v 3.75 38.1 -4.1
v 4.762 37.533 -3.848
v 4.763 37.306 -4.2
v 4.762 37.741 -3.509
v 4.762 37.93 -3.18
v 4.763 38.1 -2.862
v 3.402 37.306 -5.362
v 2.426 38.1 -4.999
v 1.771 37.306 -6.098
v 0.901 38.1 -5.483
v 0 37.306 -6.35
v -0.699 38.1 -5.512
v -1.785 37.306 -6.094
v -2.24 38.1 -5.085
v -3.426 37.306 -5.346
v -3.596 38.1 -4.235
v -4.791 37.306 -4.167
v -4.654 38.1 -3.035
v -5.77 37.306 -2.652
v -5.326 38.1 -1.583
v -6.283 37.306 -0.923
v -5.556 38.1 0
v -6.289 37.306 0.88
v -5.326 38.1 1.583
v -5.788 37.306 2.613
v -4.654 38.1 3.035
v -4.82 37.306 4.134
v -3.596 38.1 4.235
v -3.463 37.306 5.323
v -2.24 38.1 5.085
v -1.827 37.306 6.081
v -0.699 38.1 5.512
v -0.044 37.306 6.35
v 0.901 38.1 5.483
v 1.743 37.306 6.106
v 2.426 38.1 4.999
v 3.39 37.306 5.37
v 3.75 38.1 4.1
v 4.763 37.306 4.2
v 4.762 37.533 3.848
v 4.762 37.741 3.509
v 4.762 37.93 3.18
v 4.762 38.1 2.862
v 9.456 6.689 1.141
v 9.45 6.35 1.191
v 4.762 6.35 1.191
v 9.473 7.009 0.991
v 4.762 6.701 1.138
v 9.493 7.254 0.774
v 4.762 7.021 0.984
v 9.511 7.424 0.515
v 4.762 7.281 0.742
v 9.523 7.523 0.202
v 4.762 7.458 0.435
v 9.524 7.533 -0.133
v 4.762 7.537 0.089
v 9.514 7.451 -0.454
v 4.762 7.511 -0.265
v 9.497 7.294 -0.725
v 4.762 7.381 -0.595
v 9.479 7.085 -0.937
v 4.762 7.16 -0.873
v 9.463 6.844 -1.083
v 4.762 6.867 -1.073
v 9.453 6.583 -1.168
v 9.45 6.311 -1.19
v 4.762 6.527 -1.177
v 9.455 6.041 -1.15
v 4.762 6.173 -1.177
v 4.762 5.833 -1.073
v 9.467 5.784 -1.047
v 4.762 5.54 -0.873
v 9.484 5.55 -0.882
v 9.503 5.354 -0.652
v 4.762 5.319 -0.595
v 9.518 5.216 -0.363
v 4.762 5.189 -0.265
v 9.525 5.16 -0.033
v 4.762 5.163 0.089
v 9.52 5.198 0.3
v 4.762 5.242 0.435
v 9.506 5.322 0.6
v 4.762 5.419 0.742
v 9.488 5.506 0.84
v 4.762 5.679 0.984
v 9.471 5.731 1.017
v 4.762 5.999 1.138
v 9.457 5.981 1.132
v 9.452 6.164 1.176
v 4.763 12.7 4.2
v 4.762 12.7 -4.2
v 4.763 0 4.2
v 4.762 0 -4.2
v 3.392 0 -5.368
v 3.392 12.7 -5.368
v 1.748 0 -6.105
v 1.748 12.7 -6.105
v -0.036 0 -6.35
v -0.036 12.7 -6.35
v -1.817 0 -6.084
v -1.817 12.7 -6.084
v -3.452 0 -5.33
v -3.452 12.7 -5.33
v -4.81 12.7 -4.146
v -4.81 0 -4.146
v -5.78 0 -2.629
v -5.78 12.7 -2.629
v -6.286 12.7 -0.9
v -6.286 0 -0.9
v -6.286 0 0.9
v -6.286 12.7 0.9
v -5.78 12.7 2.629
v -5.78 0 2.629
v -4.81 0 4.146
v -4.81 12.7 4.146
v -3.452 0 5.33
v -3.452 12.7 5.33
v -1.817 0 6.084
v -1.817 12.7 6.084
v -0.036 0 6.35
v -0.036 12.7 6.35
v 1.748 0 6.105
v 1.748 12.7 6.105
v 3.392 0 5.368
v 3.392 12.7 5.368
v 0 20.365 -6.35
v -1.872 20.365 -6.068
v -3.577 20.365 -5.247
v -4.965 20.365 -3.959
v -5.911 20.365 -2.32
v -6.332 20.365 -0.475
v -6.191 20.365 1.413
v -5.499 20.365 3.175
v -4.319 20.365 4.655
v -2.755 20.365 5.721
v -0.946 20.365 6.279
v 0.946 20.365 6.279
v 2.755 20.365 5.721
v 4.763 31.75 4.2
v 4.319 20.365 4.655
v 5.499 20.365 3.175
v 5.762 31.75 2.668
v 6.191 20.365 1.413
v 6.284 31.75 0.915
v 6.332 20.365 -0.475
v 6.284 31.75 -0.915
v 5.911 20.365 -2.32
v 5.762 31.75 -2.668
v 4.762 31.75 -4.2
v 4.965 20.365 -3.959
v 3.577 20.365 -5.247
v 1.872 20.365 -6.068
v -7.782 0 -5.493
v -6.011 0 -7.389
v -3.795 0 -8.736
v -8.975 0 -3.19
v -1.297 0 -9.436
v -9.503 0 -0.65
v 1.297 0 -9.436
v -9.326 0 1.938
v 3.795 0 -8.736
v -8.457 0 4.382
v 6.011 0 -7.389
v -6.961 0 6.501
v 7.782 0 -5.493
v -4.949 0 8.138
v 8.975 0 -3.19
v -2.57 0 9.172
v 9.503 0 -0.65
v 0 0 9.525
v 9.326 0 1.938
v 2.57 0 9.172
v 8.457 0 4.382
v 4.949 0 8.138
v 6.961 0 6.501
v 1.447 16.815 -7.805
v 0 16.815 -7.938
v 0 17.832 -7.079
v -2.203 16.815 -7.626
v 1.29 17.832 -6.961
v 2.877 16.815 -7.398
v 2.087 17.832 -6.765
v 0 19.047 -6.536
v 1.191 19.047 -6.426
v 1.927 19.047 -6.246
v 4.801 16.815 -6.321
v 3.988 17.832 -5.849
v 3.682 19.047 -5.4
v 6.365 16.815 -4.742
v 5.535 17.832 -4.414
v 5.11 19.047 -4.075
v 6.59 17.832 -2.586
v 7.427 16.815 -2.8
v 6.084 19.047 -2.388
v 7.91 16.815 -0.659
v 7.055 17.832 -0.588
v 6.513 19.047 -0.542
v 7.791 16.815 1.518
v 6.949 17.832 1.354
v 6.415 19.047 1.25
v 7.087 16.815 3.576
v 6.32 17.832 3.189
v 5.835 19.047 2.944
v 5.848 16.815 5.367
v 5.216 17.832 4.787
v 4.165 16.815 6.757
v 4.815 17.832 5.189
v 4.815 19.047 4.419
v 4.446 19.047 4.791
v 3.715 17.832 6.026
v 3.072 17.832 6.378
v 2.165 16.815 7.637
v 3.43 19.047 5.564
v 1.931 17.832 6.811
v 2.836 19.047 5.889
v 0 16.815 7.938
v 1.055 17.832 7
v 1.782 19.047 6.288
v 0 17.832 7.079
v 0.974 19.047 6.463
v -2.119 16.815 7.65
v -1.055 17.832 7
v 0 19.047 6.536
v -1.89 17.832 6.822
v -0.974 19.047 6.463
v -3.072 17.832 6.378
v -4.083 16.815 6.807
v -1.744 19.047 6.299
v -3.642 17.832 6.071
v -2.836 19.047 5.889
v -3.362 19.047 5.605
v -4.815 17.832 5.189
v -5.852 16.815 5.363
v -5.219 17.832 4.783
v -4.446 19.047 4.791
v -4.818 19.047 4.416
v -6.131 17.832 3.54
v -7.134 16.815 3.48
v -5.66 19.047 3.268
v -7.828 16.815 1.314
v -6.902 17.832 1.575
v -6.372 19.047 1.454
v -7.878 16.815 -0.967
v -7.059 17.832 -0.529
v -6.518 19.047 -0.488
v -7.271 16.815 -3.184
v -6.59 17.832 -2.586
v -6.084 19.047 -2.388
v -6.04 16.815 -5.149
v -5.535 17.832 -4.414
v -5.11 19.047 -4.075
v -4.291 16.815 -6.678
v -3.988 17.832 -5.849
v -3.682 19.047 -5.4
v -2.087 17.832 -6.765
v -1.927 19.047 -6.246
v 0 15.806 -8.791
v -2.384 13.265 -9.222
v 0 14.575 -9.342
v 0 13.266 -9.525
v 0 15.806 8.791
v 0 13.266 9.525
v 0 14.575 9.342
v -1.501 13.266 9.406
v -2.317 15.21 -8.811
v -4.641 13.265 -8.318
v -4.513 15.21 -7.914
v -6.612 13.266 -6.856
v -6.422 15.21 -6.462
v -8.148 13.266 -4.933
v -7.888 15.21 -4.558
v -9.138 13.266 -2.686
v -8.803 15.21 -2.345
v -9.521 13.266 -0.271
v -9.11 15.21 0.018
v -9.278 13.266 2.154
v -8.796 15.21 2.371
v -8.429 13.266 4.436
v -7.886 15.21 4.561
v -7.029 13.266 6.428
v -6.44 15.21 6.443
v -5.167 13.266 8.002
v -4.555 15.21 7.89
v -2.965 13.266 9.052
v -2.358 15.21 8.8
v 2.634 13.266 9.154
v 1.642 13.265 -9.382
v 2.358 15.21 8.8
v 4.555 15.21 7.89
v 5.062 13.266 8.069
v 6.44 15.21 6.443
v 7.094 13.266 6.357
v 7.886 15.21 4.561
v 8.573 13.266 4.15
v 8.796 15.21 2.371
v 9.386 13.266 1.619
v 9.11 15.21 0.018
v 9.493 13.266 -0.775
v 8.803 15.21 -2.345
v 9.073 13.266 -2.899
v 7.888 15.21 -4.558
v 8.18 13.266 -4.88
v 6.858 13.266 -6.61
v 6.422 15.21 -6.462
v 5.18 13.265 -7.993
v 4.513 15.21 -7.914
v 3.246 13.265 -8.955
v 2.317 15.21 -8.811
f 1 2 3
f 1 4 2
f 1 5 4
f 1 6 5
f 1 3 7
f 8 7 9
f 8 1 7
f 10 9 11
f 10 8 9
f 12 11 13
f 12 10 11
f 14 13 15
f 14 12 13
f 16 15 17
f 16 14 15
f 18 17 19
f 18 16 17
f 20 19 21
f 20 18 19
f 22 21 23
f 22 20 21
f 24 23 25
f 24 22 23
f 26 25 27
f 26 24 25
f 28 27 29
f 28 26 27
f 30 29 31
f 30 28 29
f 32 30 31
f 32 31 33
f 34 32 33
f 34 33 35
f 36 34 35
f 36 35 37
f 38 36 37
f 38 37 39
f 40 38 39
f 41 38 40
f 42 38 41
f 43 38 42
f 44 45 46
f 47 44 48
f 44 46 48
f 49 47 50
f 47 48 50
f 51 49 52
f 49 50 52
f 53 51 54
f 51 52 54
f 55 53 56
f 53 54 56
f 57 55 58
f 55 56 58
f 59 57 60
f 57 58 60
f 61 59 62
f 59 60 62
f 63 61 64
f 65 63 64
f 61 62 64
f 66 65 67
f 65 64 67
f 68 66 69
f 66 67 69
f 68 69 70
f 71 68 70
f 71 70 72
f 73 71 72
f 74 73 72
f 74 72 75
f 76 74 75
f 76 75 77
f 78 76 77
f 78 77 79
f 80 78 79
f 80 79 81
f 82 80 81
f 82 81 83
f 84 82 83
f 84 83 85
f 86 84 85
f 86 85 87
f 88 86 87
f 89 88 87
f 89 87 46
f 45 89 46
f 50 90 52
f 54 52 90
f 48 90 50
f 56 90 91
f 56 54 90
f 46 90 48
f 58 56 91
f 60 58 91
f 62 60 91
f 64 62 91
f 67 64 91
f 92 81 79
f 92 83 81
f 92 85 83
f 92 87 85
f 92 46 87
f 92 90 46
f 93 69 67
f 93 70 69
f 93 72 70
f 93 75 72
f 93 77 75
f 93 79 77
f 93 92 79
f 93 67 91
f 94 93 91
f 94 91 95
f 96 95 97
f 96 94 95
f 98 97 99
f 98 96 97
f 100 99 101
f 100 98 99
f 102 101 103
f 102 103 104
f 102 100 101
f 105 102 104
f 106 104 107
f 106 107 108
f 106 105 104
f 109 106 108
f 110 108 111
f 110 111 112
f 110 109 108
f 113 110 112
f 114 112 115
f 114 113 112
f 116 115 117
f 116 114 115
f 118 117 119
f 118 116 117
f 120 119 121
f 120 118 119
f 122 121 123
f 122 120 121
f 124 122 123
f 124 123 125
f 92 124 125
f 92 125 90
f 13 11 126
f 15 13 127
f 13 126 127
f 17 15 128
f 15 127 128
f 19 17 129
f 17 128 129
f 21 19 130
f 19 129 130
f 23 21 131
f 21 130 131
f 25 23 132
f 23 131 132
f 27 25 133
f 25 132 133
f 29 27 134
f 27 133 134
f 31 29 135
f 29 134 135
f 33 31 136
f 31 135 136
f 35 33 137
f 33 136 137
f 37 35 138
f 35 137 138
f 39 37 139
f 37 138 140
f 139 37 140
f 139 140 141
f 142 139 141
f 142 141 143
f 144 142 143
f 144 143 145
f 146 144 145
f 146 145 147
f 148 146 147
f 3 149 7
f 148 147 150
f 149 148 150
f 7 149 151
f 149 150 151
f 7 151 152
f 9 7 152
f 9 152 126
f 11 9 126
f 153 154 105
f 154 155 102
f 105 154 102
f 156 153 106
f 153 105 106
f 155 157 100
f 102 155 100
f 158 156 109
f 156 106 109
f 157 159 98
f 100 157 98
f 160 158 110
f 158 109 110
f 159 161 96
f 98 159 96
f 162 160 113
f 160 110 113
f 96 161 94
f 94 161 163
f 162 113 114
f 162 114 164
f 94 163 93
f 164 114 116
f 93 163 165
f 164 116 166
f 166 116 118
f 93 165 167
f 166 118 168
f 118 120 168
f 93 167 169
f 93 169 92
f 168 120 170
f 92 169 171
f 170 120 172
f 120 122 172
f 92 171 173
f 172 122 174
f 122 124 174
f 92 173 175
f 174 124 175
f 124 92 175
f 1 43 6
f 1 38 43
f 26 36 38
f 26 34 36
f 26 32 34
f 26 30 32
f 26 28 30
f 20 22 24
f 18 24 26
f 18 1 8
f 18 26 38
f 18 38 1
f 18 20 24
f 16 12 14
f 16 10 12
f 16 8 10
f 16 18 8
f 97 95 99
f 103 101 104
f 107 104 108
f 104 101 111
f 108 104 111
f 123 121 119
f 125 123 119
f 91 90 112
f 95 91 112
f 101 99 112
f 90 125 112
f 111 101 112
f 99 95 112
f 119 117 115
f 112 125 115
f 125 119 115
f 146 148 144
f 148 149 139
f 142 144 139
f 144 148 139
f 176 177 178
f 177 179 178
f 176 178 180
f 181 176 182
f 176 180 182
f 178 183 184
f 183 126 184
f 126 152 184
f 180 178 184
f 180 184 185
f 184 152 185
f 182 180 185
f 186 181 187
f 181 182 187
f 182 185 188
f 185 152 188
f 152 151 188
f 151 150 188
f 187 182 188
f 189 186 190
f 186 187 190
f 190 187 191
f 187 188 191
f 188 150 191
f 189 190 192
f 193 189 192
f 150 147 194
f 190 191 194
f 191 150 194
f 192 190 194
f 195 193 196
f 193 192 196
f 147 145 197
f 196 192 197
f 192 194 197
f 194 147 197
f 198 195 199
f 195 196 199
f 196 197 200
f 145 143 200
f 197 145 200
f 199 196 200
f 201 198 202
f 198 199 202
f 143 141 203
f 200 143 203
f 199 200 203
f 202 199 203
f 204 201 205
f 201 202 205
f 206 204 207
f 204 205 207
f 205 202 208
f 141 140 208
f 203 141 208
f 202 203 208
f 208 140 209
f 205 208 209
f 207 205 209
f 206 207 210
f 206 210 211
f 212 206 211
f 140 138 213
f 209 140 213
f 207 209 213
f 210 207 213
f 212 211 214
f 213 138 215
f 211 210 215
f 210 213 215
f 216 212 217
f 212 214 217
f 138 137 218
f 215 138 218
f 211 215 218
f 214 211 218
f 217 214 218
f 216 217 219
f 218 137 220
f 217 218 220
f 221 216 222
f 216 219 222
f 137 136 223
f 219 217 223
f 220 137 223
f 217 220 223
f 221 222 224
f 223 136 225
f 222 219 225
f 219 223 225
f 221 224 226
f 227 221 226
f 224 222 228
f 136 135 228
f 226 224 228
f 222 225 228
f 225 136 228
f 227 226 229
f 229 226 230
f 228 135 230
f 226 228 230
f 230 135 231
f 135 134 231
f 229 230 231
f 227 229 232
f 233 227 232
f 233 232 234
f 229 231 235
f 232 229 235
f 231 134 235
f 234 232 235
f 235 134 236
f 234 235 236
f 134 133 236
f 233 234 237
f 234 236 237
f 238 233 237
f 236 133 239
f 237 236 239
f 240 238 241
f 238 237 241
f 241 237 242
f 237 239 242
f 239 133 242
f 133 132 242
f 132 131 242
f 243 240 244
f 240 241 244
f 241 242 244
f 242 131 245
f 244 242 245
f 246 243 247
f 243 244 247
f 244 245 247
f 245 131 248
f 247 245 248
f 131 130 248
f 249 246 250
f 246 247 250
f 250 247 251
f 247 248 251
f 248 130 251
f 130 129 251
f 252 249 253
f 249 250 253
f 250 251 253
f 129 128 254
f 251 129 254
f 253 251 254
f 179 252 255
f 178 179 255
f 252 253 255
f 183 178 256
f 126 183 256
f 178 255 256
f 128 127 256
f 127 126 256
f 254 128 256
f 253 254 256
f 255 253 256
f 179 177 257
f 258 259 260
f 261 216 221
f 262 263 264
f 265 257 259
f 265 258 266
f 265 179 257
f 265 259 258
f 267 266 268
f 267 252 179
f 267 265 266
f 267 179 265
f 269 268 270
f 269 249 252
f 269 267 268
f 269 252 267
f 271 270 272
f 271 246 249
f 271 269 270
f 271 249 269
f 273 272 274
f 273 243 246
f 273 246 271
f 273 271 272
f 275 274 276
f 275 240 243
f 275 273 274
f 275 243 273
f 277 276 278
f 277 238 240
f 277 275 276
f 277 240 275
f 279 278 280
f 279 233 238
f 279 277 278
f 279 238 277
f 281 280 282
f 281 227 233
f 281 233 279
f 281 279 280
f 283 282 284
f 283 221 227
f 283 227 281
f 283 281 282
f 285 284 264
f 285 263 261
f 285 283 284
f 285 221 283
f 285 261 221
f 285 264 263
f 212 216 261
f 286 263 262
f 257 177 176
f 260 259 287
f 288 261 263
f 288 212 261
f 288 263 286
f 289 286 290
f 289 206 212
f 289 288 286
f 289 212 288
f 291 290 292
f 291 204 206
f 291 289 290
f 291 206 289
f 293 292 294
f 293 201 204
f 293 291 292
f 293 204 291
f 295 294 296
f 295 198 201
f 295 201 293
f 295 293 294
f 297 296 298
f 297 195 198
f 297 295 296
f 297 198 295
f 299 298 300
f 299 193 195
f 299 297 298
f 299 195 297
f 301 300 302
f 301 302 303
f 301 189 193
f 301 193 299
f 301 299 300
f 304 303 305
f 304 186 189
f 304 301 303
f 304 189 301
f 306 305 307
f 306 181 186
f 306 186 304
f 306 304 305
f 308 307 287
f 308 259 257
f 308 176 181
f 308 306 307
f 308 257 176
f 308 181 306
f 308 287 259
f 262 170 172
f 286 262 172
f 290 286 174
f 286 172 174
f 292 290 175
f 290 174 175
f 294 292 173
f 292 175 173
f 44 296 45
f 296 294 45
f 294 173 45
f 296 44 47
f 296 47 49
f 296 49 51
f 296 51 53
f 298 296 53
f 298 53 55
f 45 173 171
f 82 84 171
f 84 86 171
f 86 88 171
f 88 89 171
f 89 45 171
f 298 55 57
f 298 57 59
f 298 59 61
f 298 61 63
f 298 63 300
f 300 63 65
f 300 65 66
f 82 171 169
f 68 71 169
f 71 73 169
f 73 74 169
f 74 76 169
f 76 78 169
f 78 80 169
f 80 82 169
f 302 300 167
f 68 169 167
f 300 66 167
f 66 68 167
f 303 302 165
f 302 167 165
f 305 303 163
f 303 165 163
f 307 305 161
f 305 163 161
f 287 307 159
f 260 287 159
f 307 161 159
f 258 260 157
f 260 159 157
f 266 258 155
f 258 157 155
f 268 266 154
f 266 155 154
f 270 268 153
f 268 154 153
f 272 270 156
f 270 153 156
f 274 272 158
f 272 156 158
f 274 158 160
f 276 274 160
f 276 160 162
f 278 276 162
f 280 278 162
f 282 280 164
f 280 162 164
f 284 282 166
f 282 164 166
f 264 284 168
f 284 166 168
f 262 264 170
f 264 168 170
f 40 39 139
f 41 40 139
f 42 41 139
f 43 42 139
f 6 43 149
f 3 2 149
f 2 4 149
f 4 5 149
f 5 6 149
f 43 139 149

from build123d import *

# Parameters (mm, degrees)
SKETCH1_R           = 6.35
BASE_EXTRUDE_DEPTH  = 38.1
SKETCH3_R           = 9.525
BOSS_EXTRUDE1_DEPTH = 15.875
CUT_EXTRUDE1_DEPTH  = 12.7
FILLET1_R           = 4.7625
FILLET2_R           = 4.7625
SKETCH5_R           = 1.190625
CUT_EXTRUDE2_DEPTH  = 42.790769119
CUT_EXTRUDE3_START  = -6.35
CUT_EXTRUDE3_DEPTH  = 6.35
CHAMFER1_SIZE       = 0.79375


with BuildPart() as part:
    # Sketch1 → Base-Extrude (new body)
    with BuildSketch(Plane(origin=(0, 0, 0), x_dir=(-1, 0, 0), z_dir=(0, 1, 0))):
        with Locations(Location((0, 0, 0), (0, 0, 270))):
            Circle(SKETCH1_R)
    extrude(amount=BASE_EXTRUDE_DEPTH)

    # Sketch3 → Boss-Extrude1 (add)
    with BuildSketch(Plane(origin=(0, 0, 0), x_dir=(-1, 0, 0), z_dir=(0, 1, 0))):
        with Locations(Location((0, 0, 0), (0, 0, 90))):
            Circle(SKETCH3_R)
    extrude(amount=BOSS_EXTRUDE1_DEPTH)

    # Sketch4 → Cut-Extrude1 (cut)
    with BuildSketch(Plane(origin=(0, 0, 0), x_dir=(-1, 0, 0), z_dir=(0, 1, 0))):
        with BuildLine():
            Line((-4.7625, 4.200130206), (-4.7625, -4.200130206))
            ThreePointArc((-4.7625, -4.200130206), (6.35, 0), (-4.7625, 4.200130206))
        make_face()
    extrude(amount=CUT_EXTRUDE1_DEPTH, mode=Mode.SUBTRACT)

    # Fillet1
    # the kernel refuses this fillet: 4.7625 mm, written as the material it adds along each edge
    with BuildSketch(Plane(origin=(0, 15.875, 0), x_dir=(0, 0, -1), z_dir=(-1, 0, 0))) as fillet1_piece_1:
        with BuildLine():
            CenterArc((11.1125, -4.490128061), FILLET1_R, 109.471220634, 70.528779366)
            Line((6.35, -4.490128061), (6.25475, -4.490128061))
            Line((6.25475, -4.490128061), (6.25475, 0))
            Line((6.25475, 0), (6.35, 0.09525))
            ThreePointArc((6.35, 0.09525), (7.9375, 0.09525), (9.49325, 0.089802561))
            Line((9.49325, 0.089802561), (9.525, 0))
        make_face()
    revolve(axis=Axis((0, 15.875, 0), (0, -1, 0)))

    # Fillet2
    fillet2_edges = [part.edges().sort_by_distance(p)[0] for p in [
        (9.525, 15.875, 0),
    ]]
    fillet(fillet2_edges, radius=FILLET2_R)

    # Sketch5 → Cut-Extrude2 (cut, through all)
    with BuildSketch(Plane.ZY.offset(-4.7625)):
        with Locations((0, 6.35)):
            Circle(SKETCH5_R)
    extrude(amount=-CUT_EXTRUDE2_DEPTH, mode=Mode.SUBTRACT)

    # Sketch7 → Cut-Extrude3 (cut)
    with BuildSketch(Plane(origin=(0, 38.1, 0), x_dir=(-1, 0, 0), z_dir=(0, 1, 0)).offset(CUT_EXTRUDE3_START)):
        with BuildLine():
            Line((-4.7625, 4.200130206), (-4.7625, -4.200130206))
            ThreePointArc((-4.7625, -4.200130206), (-6.35, 0), (-4.7625, 4.200130206))
        make_face()
    extrude(amount=CUT_EXTRUDE3_DEPTH, mode=Mode.SUBTRACT)

    # Chamfer1
    chamfer1_edges = [part.edges().sort_by_distance(p)[0] for p in [
        (-5.787630206, 38.1, 2.612630206),
    ]]
    chamfer(chamfer1_edges, length=CHAMFER1_SIZE)


solid = part.part
